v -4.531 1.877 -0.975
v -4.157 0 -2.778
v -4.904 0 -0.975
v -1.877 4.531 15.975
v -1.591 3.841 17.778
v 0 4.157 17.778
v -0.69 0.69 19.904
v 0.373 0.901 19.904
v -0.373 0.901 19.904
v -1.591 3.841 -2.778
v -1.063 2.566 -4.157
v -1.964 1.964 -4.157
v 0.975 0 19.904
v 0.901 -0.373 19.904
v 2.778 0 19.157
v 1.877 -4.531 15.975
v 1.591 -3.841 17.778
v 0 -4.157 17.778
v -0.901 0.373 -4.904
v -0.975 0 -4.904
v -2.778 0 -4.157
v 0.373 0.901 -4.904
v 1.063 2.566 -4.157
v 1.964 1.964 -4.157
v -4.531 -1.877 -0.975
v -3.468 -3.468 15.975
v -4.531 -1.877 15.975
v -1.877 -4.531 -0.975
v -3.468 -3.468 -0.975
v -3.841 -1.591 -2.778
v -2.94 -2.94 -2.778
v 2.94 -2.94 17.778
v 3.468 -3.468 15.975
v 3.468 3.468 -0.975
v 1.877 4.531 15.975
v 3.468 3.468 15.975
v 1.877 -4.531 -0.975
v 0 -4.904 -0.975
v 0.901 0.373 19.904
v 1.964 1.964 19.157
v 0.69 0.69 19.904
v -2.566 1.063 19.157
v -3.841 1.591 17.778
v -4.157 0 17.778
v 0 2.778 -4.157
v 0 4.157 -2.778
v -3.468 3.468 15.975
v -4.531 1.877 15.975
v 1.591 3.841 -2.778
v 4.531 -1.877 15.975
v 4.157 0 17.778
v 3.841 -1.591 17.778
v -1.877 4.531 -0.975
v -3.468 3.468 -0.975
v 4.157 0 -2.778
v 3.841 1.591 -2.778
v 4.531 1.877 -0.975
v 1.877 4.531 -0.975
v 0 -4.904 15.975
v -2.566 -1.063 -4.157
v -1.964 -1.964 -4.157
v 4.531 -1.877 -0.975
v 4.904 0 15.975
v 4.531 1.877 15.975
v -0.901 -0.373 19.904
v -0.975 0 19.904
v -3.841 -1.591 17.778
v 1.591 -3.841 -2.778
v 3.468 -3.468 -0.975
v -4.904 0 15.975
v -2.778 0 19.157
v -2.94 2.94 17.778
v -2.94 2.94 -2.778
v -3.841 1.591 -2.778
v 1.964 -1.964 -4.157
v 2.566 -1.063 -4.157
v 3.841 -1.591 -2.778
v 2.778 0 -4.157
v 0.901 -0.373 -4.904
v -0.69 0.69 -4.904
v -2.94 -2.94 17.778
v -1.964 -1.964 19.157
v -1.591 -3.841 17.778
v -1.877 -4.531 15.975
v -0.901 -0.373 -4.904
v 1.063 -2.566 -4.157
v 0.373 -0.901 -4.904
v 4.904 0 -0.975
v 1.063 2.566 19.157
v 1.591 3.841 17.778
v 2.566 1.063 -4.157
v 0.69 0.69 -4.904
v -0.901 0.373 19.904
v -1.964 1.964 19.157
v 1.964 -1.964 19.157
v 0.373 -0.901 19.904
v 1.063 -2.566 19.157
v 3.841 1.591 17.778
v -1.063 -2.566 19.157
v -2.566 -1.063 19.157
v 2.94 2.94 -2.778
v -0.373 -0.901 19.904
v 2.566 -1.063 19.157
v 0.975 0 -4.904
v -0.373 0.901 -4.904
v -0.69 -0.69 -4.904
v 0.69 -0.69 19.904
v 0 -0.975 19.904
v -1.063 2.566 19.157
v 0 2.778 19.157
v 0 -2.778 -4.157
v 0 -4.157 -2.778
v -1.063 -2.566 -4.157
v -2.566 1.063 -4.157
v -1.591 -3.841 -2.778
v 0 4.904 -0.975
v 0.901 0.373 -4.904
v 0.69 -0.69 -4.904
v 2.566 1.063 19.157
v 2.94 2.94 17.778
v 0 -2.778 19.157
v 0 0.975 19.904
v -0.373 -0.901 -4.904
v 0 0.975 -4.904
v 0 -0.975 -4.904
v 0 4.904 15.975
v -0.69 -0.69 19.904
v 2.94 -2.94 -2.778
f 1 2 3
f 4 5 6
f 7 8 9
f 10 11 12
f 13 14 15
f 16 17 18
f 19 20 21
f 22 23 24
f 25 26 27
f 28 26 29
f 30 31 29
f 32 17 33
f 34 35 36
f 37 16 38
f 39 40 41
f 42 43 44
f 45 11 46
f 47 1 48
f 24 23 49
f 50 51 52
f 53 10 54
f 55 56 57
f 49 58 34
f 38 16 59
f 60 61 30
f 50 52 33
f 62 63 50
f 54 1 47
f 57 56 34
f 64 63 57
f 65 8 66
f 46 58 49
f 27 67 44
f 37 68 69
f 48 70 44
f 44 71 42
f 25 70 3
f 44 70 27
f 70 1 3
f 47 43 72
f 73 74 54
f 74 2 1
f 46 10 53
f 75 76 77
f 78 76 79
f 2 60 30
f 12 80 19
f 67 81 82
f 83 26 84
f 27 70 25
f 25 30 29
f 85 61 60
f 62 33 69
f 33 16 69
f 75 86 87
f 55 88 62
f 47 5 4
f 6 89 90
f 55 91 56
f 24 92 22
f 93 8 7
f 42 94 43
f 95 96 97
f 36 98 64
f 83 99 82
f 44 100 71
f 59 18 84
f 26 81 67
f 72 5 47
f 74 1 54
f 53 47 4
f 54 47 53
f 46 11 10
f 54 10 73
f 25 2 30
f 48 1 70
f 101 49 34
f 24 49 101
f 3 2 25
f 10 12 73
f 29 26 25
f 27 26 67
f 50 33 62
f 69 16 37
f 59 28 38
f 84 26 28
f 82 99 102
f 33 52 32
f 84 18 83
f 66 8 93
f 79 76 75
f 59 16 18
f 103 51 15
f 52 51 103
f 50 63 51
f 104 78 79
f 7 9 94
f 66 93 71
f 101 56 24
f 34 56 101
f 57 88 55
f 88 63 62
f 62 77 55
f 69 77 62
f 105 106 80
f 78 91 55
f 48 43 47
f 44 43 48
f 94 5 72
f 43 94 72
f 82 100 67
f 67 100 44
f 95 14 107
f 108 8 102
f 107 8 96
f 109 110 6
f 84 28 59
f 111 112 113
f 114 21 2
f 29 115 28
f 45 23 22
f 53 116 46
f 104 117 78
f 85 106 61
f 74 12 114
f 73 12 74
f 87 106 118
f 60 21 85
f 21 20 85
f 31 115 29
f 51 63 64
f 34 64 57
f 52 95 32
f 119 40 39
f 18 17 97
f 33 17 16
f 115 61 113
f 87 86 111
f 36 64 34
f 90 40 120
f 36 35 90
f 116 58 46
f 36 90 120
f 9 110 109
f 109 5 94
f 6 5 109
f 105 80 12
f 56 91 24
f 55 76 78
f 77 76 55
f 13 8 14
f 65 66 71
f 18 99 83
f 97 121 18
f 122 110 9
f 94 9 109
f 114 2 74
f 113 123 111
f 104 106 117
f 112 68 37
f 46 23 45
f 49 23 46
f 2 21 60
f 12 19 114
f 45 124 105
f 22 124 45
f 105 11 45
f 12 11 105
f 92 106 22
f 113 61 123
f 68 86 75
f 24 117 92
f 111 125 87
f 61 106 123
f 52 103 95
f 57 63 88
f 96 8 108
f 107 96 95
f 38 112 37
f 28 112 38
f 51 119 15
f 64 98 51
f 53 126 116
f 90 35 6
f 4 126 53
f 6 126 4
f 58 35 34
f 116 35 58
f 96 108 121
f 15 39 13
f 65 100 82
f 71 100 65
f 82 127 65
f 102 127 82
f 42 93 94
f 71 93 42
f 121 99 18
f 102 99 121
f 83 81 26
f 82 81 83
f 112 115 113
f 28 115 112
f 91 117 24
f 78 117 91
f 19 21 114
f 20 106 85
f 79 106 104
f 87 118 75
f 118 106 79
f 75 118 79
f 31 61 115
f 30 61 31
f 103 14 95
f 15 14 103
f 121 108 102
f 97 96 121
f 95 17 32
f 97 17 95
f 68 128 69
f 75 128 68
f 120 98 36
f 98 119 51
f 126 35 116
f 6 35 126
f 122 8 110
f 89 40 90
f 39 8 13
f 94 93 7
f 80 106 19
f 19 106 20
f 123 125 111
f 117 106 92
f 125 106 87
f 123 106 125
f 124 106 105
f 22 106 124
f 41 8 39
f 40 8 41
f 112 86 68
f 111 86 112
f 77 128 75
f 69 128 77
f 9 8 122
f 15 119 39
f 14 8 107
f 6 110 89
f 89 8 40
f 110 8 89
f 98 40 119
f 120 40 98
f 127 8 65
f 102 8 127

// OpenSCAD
module pill(height=5)
{
hull()
{
sphere(height);
translate([0,0,15])sphere(height);
}
}
pill();
